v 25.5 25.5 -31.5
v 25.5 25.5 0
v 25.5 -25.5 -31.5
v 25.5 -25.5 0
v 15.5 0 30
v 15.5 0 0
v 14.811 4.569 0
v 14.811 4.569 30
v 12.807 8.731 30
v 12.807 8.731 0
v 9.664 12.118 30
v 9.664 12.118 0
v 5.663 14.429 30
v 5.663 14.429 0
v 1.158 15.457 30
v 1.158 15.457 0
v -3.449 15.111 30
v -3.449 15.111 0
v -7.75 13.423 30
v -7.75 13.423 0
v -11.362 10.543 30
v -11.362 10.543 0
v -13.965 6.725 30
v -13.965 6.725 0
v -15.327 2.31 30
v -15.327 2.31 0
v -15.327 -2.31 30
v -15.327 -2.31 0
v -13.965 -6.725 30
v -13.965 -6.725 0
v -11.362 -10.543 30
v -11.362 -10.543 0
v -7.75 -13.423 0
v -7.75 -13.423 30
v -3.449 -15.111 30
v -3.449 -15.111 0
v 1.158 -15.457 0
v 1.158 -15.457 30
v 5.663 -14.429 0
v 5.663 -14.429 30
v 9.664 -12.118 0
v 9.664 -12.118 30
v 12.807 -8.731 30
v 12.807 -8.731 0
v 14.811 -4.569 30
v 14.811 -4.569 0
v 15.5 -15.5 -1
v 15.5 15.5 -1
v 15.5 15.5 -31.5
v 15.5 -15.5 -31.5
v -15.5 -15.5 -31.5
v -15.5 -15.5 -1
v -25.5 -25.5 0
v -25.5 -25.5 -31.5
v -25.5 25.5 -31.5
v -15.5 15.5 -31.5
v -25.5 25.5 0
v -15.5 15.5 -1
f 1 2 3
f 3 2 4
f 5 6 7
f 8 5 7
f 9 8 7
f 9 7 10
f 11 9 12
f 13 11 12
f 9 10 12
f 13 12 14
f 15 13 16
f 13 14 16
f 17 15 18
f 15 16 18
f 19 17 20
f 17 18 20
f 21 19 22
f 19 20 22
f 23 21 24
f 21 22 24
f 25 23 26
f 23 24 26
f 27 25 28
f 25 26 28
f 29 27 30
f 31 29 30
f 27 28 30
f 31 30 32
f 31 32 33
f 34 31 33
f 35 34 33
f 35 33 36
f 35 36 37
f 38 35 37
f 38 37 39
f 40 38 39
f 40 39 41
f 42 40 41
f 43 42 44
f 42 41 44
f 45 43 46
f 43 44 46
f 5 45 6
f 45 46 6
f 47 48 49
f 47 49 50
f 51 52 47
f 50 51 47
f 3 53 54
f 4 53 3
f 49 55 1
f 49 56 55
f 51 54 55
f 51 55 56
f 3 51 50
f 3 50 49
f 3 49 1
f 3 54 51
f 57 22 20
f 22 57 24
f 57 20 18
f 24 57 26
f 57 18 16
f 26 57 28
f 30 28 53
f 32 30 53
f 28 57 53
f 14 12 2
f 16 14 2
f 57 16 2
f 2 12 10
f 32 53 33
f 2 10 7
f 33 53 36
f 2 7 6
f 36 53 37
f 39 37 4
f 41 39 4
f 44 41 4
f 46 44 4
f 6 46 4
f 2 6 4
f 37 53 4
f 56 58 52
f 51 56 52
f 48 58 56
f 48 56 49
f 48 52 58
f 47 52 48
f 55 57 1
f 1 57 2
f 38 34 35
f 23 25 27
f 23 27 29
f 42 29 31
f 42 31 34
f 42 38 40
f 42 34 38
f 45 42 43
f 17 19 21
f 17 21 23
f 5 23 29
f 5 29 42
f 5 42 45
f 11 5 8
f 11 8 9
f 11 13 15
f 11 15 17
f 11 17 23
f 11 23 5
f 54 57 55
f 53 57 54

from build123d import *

# Parameters (mm, degrees)
F0_R     = 15.5
F1_DEPTH = 30
F2_W     = 51
F2_H     = 51
F3_DEPTH = 1
F4_W     = 51
F4_H     = 51
F4_W_2   = 31
F4_H_2   = 31
F5_DEPTH = 30.5


with BuildPart() as f1:
    # F0 (on Top) → F1 (new body)
    with BuildSketch(Plane.XY):
        Circle(F0_R)
    extrude(amount=F1_DEPTH)

    # F2 (on face) → F3 (join)
    with BuildSketch(Plane(origin=(0, 0, 0), x_dir=(1, 0, 0), z_dir=(0, 0, -1))):
        Rectangle(F2_W, F2_H)
        Polygon((15.5, 0), (15.5, -15.5), (0, -15.5), (-15.5, -15.5), (-15.5, 0), (-15.5, 15.5), (-6.64e-08, 15.5), (15.5, 15.5), align=None, mode=Mode.SUBTRACT)
        with BuildLine():
            Line((0, -15.5), (15.5, -15.5))
            Line((15.5, -15.5), (15.5, 0))
            ThreePointArc((15.5, 0), (10.9601551084, -10.9601551084), (0, -15.5))
        make_face()
        with BuildLine():
            Line((-15.5, -15.5), (0, -15.5))
            ThreePointArc((0, -15.5), (-10.9601551084, -10.9601551084), (-15.5, 0))
            Line((-15.5, 0), (-15.5, -15.5))
        make_face()
        with BuildLine():
            ThreePointArc((-15.5, 0), (-10.9601551084, -10.9601551084), (0, -15.5))
            ThreePointArc((0, -15.5), (10.9601551084, -10.9601551084), (15.5, 0))
            ThreePointArc((15.5, 0), (10.9601550849, 10.9601551319), (-6.64e-08, 15.5))
            ThreePointArc((-6.64e-08, 15.5), (-10.9601551319, 10.9601550849), (-15.5, 0))
        make_face()
        with BuildLine():
            ThreePointArc((-6.64e-08, 15.5), (10.9601550849, 10.9601551319), (15.5, 0))
            Line((15.5, 0), (15.5, 15.5))
            Line((15.5, 15.5), (-6.64e-08, 15.5))
        make_face()
        with BuildLine():
            Line((-15.5, 15.5), (-15.5, 0))
            ThreePointArc((-15.5, 0), (-10.9601551319, 10.9601550849), (-6.64e-08, 15.5))
            Line((-6.64e-08, 15.5), (-15.5, 15.5))
        make_face()
    extrude(amount=F3_DEPTH)

    # F4 (on face) → F5 (join)
    with BuildSketch(Plane(origin=(0, 0, -1), x_dir=(1, 0, 0), z_dir=(0, 0, -1))):
        Rectangle(F4_W, F4_H)
        Rectangle(F4_W_2, F4_H_2, mode=Mode.SUBTRACT)
    extrude(amount=F5_DEPTH)


solid = f1.part
